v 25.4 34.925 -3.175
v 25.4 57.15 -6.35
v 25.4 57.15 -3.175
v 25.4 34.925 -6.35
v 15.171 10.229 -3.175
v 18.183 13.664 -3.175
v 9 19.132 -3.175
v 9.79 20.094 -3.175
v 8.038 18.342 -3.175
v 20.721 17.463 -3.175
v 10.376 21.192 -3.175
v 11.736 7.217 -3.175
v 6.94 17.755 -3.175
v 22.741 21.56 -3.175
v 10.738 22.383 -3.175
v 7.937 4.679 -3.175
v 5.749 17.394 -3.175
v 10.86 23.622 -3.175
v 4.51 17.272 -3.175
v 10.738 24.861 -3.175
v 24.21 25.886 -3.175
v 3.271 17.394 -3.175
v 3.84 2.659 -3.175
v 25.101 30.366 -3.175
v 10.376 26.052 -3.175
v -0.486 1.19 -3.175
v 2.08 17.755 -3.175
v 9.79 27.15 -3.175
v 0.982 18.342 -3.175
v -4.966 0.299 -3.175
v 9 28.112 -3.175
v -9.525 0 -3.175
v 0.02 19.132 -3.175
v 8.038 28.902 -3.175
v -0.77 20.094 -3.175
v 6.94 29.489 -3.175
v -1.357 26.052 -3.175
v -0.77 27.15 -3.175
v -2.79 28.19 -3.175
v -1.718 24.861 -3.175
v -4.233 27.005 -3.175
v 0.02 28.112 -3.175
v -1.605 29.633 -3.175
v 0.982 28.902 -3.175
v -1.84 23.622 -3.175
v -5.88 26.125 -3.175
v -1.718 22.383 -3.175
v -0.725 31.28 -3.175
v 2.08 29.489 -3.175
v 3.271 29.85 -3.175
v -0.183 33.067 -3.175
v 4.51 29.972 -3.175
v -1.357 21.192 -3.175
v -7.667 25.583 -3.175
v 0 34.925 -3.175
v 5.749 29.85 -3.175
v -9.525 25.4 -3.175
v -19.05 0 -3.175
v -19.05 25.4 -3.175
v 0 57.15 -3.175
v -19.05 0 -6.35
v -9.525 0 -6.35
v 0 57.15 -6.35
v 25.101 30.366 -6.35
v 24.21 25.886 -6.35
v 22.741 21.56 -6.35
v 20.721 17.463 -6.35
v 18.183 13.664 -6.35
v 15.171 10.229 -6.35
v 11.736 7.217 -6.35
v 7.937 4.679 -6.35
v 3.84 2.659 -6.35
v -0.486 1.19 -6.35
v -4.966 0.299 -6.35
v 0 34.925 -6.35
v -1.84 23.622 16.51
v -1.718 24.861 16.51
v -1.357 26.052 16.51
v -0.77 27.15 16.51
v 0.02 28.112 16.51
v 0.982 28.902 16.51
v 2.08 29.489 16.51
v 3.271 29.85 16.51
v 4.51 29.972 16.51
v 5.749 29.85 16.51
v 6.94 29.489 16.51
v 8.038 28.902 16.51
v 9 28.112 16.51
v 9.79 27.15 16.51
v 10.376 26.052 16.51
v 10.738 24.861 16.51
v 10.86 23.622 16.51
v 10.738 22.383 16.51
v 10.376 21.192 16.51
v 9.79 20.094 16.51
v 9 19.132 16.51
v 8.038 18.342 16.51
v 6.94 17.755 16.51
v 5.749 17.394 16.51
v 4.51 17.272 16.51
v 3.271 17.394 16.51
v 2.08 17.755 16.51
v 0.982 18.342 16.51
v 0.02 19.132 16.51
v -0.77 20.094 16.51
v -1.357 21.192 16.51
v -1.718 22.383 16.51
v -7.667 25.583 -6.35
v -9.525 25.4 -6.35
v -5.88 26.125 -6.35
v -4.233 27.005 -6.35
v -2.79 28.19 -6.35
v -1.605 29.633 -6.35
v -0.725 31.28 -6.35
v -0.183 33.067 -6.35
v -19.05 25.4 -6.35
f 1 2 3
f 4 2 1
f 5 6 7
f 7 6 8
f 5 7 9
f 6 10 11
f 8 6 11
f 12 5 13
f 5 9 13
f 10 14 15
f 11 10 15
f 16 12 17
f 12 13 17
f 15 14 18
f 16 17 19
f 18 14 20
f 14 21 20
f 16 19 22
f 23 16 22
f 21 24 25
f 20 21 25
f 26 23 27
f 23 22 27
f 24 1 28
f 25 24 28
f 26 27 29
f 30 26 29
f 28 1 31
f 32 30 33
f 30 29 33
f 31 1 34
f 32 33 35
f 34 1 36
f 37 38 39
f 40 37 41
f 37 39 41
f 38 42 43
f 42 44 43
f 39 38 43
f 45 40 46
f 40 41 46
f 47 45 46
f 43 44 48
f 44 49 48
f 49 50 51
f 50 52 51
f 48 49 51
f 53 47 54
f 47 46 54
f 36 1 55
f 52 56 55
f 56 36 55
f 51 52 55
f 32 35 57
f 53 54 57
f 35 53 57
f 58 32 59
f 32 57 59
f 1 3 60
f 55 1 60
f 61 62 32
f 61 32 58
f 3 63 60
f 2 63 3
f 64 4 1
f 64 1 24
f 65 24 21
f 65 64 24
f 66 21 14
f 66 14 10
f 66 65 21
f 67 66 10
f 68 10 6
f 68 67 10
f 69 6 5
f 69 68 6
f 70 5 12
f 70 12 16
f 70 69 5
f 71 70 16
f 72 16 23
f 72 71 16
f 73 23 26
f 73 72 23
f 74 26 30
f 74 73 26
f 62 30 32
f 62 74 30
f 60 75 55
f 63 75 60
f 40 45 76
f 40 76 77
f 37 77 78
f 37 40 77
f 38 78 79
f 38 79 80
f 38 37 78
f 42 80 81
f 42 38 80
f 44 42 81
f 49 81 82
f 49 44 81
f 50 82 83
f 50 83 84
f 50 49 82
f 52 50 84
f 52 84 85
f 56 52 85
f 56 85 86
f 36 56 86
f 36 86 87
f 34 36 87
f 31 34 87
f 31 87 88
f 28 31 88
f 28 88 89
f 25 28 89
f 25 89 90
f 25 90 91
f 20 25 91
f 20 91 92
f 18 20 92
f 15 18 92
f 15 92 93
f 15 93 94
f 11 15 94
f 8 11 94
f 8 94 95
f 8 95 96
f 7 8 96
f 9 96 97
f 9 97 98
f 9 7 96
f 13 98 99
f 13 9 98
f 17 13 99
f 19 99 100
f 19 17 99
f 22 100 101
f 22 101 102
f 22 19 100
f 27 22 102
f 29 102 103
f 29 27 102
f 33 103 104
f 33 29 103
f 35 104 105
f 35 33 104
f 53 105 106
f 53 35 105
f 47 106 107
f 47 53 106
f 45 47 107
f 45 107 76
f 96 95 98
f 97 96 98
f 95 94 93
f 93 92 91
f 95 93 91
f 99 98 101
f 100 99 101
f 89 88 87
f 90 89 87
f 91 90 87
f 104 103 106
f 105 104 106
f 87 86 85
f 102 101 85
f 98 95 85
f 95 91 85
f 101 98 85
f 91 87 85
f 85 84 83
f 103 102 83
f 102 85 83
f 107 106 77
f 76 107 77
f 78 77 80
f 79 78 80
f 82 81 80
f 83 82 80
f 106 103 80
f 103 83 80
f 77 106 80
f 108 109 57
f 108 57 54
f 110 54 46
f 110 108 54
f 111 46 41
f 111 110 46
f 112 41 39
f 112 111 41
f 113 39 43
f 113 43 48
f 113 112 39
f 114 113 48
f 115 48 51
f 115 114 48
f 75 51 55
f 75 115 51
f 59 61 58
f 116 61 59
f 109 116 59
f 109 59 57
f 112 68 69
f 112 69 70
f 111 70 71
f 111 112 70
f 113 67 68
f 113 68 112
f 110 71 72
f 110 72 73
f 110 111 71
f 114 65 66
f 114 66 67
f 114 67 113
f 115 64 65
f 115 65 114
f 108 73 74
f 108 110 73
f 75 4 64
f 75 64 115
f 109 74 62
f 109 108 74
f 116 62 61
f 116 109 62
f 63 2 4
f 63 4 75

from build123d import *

# Parameters (mm, degrees)
F0_R     = 6.35
F1_DEPTH = 22.86
F2_DEPTH = 3.175
F3_ANGLE = 180


with BuildPart() as f1:
    # F0 (on Top) → F1 (new body)
    with BuildSketch(Plane.XY):
        with Locations((-4.509694, 23.622)):
            Circle(F0_R)
    extrude(amount=-F1_DEPTH)

    # F0 (on Top) → F2 (join)
    with BuildSketch(Plane.XY):
        with BuildLine():
            Line((0, 57.15), (-25.4, 57.15))
            Line((-25.4, 57.15), (-25.4, 34.925))
            ThreePointArc((-25.4, 34.925), (-15.170704, 10.229296), (9.525, 0))
            Line((9.525, 0), (19.05, 0))
            Line((19.05, 0), (19.05, 25.4))
            Line((19.05, 25.4), (9.525, 25.4))
            ThreePointArc((9.525, 25.4), (2.789808, 28.189808), (0, 34.925))
            Line((0, 34.925), (0, 57.15))
        make_face()
        with Locations((-4.509694, 23.622)):
            Circle(F0_R, mode=Mode.SUBTRACT)
    extrude(amount=-F2_DEPTH)


with BuildPart() as f1_1:
    # F3: moved
    add(f1.part.rotate(Axis((0, 46.0375, -3.175), (0, 1, 0)), F3_ANGLE))


solid = f1_1.part
